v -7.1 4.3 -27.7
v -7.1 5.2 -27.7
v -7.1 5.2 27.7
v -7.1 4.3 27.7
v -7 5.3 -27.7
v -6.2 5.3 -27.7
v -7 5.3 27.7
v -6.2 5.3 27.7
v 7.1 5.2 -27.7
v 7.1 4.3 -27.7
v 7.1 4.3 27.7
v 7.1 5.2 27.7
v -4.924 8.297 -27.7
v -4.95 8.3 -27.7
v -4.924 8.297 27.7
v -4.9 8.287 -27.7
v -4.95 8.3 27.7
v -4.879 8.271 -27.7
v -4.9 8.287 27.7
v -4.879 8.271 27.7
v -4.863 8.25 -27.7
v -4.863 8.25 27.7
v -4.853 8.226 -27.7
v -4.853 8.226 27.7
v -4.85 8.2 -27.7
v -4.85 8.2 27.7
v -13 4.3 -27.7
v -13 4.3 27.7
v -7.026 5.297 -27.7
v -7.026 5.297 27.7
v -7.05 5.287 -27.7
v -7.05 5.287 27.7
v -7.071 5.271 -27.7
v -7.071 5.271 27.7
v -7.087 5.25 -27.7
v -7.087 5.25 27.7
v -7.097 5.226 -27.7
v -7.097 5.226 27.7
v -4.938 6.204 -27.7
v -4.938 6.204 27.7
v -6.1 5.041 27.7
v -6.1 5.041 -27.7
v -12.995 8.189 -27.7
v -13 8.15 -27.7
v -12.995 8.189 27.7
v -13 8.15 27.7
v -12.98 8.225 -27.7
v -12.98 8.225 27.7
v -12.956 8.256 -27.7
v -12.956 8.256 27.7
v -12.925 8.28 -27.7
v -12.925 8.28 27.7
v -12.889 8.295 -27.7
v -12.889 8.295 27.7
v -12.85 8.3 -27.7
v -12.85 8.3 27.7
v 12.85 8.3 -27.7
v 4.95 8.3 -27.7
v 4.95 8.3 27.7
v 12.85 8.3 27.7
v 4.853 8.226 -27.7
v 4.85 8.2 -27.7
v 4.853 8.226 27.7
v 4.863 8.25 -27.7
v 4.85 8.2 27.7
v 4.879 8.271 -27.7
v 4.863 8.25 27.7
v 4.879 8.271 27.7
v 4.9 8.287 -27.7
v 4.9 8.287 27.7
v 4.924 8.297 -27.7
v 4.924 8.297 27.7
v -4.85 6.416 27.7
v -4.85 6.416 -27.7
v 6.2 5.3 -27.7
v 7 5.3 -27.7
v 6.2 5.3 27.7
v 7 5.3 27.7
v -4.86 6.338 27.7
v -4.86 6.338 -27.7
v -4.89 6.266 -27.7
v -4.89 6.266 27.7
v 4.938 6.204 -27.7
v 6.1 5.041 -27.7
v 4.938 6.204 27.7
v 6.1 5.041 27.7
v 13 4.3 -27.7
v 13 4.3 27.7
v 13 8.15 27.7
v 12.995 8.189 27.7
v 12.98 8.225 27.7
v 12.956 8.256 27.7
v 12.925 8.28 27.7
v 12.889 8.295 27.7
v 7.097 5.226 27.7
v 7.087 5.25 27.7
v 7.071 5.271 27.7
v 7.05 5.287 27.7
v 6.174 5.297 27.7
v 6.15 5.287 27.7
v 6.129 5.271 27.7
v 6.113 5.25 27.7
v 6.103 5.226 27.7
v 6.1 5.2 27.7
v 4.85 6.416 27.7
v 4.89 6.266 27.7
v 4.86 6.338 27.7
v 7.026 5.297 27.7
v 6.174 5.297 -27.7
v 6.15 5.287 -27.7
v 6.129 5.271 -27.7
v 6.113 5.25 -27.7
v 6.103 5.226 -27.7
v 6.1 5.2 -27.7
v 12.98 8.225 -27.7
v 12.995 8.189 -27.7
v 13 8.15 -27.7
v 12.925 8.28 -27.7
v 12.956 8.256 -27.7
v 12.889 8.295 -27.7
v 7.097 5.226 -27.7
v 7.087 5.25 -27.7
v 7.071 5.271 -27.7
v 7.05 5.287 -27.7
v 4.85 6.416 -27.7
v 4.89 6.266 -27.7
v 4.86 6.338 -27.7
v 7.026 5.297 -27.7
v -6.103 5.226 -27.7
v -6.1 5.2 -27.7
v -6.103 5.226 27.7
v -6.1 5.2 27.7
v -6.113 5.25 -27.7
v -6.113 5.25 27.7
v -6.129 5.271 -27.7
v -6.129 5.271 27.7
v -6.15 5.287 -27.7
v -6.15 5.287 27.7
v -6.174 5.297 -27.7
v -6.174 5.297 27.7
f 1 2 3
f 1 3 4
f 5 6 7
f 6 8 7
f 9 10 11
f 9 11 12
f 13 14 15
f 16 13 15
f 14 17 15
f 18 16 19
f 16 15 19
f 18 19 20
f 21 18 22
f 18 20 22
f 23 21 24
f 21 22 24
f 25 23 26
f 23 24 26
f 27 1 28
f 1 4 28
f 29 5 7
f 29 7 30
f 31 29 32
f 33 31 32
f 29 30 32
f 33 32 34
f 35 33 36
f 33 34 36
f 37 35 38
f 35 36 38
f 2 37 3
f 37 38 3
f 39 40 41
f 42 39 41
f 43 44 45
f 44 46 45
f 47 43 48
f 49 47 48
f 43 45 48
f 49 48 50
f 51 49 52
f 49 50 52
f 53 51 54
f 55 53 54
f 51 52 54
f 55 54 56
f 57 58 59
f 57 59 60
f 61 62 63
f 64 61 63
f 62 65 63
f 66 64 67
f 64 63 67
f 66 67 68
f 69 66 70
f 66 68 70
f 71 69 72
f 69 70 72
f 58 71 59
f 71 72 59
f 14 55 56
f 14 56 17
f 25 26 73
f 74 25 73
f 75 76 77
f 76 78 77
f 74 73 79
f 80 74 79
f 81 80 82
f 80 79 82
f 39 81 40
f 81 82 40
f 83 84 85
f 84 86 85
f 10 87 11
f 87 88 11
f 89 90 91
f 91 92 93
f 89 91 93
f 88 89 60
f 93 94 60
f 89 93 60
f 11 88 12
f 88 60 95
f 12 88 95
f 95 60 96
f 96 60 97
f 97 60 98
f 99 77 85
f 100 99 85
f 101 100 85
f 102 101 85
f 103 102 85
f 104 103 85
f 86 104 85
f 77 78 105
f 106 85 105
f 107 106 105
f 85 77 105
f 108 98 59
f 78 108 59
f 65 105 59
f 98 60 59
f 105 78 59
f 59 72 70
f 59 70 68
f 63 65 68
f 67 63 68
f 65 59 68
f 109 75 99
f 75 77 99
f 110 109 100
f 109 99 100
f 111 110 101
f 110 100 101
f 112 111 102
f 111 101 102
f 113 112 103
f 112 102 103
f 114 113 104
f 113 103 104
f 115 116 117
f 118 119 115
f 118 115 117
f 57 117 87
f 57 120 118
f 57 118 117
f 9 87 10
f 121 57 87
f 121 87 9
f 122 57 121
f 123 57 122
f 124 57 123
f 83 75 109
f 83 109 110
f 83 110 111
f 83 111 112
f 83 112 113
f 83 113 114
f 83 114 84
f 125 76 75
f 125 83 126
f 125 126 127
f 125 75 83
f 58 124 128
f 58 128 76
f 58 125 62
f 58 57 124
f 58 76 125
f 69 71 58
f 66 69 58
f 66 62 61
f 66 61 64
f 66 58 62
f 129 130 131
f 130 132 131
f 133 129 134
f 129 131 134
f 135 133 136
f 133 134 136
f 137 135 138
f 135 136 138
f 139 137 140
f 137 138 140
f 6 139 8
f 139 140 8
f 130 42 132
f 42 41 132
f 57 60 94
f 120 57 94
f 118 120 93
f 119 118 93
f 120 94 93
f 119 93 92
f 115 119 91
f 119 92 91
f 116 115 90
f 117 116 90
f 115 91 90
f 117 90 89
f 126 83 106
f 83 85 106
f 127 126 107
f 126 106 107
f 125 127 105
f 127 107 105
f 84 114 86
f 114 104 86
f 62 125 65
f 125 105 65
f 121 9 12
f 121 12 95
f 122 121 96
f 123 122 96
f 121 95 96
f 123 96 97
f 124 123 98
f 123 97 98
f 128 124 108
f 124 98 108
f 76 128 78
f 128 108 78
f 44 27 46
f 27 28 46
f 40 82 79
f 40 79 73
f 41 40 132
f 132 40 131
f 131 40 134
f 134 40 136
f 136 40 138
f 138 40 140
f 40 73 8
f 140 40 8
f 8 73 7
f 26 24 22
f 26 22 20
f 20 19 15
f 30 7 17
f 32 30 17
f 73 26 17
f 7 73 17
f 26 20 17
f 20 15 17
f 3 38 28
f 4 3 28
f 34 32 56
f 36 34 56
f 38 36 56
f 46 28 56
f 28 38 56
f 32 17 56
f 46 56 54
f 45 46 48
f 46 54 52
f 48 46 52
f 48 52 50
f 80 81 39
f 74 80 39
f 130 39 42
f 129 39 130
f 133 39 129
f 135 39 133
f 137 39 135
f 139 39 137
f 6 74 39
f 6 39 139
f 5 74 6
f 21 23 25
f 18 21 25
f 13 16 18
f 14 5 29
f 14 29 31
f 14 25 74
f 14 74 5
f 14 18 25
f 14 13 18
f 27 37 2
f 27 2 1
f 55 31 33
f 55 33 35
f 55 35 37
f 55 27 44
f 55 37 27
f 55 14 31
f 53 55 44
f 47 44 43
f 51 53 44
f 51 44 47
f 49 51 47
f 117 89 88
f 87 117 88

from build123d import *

# Parameters (mm, degrees)
RETAINERS_DEPTH   = 27.7
RETAINERS_2_DEPTH = 27.7


with BuildPart() as part:
    # Retainer Profile → Retainers (new body, symmetric)
    with BuildSketch(Plane.XY):
        with BuildLine():
            Line((13, 8.15), (13, 4.3))
            Line((13, 4.3), (7.1, 4.3))
            Line((7.1, 4.3), (7.1, 5.2))
            ThreePointArc((7.1, 5.2), (7.070710678, 5.270710678), (7, 5.3))
            Line((7, 5.3), (6.2, 5.3))
            ThreePointArc((6.2, 5.3), (6.129289322, 5.270710678), (6.1, 5.2))
            Line((6.1, 5.2), (6.1, 5.041421356))
            Line((6.1, 5.041421356), (4.937867966, 6.203553391))
            ThreePointArc((4.937867966, 6.203553391), (4.87283614, 6.300880395), (4.85, 6.415685425))
            Line((4.85, 6.415685425), (4.85, 8.2))
            ThreePointArc((4.85, 8.2), (4.879289322, 8.270710678), (4.95, 8.3))
            Line((4.95, 8.3), (12.85, 8.3))
            ThreePointArc((12.85, 8.3), (12.956066017, 8.256066017), (13, 8.15))
        make_face()
    extrude(amount=RETAINERS_DEPTH, both=True)


with BuildPart() as body_2:
    # Retainer Profile → Retainers 2 (new body, symmetric)
    with BuildSketch(Plane.XY):
        with BuildLine():
            Line((-4.937867966, 6.203553391), (-6.1, 5.041421356))
            Line((-6.1, 5.041421356), (-6.1, 5.2))
            ThreePointArc((-6.1, 5.2), (-6.129289322, 5.270710678), (-6.2, 5.3))
            Line((-6.2, 5.3), (-7, 5.3))
            ThreePointArc((-7, 5.3), (-7.070710678, 5.270710678), (-7.1, 5.2))
            Line((-7.1, 5.2), (-7.1, 4.3))
            Line((-7.1, 4.3), (-13, 4.3))
            Line((-13, 4.3), (-13, 8.15))
            ThreePointArc((-13, 8.15), (-12.956066017, 8.256066017), (-12.85, 8.3))
            Line((-12.85, 8.3), (-4.95, 8.3))
            ThreePointArc((-4.95, 8.3), (-4.879289322, 8.270710678), (-4.85, 8.2))
            Line((-4.85, 8.2), (-4.85, 6.415685425))
            ThreePointArc((-4.85, 6.415685425), (-4.87283614, 6.300880395), (-4.937867966, 6.203553391))
        make_face()
    extrude(amount=RETAINERS_2_DEPTH, both=True)


solid = Compound([part.part, body_2.part])
